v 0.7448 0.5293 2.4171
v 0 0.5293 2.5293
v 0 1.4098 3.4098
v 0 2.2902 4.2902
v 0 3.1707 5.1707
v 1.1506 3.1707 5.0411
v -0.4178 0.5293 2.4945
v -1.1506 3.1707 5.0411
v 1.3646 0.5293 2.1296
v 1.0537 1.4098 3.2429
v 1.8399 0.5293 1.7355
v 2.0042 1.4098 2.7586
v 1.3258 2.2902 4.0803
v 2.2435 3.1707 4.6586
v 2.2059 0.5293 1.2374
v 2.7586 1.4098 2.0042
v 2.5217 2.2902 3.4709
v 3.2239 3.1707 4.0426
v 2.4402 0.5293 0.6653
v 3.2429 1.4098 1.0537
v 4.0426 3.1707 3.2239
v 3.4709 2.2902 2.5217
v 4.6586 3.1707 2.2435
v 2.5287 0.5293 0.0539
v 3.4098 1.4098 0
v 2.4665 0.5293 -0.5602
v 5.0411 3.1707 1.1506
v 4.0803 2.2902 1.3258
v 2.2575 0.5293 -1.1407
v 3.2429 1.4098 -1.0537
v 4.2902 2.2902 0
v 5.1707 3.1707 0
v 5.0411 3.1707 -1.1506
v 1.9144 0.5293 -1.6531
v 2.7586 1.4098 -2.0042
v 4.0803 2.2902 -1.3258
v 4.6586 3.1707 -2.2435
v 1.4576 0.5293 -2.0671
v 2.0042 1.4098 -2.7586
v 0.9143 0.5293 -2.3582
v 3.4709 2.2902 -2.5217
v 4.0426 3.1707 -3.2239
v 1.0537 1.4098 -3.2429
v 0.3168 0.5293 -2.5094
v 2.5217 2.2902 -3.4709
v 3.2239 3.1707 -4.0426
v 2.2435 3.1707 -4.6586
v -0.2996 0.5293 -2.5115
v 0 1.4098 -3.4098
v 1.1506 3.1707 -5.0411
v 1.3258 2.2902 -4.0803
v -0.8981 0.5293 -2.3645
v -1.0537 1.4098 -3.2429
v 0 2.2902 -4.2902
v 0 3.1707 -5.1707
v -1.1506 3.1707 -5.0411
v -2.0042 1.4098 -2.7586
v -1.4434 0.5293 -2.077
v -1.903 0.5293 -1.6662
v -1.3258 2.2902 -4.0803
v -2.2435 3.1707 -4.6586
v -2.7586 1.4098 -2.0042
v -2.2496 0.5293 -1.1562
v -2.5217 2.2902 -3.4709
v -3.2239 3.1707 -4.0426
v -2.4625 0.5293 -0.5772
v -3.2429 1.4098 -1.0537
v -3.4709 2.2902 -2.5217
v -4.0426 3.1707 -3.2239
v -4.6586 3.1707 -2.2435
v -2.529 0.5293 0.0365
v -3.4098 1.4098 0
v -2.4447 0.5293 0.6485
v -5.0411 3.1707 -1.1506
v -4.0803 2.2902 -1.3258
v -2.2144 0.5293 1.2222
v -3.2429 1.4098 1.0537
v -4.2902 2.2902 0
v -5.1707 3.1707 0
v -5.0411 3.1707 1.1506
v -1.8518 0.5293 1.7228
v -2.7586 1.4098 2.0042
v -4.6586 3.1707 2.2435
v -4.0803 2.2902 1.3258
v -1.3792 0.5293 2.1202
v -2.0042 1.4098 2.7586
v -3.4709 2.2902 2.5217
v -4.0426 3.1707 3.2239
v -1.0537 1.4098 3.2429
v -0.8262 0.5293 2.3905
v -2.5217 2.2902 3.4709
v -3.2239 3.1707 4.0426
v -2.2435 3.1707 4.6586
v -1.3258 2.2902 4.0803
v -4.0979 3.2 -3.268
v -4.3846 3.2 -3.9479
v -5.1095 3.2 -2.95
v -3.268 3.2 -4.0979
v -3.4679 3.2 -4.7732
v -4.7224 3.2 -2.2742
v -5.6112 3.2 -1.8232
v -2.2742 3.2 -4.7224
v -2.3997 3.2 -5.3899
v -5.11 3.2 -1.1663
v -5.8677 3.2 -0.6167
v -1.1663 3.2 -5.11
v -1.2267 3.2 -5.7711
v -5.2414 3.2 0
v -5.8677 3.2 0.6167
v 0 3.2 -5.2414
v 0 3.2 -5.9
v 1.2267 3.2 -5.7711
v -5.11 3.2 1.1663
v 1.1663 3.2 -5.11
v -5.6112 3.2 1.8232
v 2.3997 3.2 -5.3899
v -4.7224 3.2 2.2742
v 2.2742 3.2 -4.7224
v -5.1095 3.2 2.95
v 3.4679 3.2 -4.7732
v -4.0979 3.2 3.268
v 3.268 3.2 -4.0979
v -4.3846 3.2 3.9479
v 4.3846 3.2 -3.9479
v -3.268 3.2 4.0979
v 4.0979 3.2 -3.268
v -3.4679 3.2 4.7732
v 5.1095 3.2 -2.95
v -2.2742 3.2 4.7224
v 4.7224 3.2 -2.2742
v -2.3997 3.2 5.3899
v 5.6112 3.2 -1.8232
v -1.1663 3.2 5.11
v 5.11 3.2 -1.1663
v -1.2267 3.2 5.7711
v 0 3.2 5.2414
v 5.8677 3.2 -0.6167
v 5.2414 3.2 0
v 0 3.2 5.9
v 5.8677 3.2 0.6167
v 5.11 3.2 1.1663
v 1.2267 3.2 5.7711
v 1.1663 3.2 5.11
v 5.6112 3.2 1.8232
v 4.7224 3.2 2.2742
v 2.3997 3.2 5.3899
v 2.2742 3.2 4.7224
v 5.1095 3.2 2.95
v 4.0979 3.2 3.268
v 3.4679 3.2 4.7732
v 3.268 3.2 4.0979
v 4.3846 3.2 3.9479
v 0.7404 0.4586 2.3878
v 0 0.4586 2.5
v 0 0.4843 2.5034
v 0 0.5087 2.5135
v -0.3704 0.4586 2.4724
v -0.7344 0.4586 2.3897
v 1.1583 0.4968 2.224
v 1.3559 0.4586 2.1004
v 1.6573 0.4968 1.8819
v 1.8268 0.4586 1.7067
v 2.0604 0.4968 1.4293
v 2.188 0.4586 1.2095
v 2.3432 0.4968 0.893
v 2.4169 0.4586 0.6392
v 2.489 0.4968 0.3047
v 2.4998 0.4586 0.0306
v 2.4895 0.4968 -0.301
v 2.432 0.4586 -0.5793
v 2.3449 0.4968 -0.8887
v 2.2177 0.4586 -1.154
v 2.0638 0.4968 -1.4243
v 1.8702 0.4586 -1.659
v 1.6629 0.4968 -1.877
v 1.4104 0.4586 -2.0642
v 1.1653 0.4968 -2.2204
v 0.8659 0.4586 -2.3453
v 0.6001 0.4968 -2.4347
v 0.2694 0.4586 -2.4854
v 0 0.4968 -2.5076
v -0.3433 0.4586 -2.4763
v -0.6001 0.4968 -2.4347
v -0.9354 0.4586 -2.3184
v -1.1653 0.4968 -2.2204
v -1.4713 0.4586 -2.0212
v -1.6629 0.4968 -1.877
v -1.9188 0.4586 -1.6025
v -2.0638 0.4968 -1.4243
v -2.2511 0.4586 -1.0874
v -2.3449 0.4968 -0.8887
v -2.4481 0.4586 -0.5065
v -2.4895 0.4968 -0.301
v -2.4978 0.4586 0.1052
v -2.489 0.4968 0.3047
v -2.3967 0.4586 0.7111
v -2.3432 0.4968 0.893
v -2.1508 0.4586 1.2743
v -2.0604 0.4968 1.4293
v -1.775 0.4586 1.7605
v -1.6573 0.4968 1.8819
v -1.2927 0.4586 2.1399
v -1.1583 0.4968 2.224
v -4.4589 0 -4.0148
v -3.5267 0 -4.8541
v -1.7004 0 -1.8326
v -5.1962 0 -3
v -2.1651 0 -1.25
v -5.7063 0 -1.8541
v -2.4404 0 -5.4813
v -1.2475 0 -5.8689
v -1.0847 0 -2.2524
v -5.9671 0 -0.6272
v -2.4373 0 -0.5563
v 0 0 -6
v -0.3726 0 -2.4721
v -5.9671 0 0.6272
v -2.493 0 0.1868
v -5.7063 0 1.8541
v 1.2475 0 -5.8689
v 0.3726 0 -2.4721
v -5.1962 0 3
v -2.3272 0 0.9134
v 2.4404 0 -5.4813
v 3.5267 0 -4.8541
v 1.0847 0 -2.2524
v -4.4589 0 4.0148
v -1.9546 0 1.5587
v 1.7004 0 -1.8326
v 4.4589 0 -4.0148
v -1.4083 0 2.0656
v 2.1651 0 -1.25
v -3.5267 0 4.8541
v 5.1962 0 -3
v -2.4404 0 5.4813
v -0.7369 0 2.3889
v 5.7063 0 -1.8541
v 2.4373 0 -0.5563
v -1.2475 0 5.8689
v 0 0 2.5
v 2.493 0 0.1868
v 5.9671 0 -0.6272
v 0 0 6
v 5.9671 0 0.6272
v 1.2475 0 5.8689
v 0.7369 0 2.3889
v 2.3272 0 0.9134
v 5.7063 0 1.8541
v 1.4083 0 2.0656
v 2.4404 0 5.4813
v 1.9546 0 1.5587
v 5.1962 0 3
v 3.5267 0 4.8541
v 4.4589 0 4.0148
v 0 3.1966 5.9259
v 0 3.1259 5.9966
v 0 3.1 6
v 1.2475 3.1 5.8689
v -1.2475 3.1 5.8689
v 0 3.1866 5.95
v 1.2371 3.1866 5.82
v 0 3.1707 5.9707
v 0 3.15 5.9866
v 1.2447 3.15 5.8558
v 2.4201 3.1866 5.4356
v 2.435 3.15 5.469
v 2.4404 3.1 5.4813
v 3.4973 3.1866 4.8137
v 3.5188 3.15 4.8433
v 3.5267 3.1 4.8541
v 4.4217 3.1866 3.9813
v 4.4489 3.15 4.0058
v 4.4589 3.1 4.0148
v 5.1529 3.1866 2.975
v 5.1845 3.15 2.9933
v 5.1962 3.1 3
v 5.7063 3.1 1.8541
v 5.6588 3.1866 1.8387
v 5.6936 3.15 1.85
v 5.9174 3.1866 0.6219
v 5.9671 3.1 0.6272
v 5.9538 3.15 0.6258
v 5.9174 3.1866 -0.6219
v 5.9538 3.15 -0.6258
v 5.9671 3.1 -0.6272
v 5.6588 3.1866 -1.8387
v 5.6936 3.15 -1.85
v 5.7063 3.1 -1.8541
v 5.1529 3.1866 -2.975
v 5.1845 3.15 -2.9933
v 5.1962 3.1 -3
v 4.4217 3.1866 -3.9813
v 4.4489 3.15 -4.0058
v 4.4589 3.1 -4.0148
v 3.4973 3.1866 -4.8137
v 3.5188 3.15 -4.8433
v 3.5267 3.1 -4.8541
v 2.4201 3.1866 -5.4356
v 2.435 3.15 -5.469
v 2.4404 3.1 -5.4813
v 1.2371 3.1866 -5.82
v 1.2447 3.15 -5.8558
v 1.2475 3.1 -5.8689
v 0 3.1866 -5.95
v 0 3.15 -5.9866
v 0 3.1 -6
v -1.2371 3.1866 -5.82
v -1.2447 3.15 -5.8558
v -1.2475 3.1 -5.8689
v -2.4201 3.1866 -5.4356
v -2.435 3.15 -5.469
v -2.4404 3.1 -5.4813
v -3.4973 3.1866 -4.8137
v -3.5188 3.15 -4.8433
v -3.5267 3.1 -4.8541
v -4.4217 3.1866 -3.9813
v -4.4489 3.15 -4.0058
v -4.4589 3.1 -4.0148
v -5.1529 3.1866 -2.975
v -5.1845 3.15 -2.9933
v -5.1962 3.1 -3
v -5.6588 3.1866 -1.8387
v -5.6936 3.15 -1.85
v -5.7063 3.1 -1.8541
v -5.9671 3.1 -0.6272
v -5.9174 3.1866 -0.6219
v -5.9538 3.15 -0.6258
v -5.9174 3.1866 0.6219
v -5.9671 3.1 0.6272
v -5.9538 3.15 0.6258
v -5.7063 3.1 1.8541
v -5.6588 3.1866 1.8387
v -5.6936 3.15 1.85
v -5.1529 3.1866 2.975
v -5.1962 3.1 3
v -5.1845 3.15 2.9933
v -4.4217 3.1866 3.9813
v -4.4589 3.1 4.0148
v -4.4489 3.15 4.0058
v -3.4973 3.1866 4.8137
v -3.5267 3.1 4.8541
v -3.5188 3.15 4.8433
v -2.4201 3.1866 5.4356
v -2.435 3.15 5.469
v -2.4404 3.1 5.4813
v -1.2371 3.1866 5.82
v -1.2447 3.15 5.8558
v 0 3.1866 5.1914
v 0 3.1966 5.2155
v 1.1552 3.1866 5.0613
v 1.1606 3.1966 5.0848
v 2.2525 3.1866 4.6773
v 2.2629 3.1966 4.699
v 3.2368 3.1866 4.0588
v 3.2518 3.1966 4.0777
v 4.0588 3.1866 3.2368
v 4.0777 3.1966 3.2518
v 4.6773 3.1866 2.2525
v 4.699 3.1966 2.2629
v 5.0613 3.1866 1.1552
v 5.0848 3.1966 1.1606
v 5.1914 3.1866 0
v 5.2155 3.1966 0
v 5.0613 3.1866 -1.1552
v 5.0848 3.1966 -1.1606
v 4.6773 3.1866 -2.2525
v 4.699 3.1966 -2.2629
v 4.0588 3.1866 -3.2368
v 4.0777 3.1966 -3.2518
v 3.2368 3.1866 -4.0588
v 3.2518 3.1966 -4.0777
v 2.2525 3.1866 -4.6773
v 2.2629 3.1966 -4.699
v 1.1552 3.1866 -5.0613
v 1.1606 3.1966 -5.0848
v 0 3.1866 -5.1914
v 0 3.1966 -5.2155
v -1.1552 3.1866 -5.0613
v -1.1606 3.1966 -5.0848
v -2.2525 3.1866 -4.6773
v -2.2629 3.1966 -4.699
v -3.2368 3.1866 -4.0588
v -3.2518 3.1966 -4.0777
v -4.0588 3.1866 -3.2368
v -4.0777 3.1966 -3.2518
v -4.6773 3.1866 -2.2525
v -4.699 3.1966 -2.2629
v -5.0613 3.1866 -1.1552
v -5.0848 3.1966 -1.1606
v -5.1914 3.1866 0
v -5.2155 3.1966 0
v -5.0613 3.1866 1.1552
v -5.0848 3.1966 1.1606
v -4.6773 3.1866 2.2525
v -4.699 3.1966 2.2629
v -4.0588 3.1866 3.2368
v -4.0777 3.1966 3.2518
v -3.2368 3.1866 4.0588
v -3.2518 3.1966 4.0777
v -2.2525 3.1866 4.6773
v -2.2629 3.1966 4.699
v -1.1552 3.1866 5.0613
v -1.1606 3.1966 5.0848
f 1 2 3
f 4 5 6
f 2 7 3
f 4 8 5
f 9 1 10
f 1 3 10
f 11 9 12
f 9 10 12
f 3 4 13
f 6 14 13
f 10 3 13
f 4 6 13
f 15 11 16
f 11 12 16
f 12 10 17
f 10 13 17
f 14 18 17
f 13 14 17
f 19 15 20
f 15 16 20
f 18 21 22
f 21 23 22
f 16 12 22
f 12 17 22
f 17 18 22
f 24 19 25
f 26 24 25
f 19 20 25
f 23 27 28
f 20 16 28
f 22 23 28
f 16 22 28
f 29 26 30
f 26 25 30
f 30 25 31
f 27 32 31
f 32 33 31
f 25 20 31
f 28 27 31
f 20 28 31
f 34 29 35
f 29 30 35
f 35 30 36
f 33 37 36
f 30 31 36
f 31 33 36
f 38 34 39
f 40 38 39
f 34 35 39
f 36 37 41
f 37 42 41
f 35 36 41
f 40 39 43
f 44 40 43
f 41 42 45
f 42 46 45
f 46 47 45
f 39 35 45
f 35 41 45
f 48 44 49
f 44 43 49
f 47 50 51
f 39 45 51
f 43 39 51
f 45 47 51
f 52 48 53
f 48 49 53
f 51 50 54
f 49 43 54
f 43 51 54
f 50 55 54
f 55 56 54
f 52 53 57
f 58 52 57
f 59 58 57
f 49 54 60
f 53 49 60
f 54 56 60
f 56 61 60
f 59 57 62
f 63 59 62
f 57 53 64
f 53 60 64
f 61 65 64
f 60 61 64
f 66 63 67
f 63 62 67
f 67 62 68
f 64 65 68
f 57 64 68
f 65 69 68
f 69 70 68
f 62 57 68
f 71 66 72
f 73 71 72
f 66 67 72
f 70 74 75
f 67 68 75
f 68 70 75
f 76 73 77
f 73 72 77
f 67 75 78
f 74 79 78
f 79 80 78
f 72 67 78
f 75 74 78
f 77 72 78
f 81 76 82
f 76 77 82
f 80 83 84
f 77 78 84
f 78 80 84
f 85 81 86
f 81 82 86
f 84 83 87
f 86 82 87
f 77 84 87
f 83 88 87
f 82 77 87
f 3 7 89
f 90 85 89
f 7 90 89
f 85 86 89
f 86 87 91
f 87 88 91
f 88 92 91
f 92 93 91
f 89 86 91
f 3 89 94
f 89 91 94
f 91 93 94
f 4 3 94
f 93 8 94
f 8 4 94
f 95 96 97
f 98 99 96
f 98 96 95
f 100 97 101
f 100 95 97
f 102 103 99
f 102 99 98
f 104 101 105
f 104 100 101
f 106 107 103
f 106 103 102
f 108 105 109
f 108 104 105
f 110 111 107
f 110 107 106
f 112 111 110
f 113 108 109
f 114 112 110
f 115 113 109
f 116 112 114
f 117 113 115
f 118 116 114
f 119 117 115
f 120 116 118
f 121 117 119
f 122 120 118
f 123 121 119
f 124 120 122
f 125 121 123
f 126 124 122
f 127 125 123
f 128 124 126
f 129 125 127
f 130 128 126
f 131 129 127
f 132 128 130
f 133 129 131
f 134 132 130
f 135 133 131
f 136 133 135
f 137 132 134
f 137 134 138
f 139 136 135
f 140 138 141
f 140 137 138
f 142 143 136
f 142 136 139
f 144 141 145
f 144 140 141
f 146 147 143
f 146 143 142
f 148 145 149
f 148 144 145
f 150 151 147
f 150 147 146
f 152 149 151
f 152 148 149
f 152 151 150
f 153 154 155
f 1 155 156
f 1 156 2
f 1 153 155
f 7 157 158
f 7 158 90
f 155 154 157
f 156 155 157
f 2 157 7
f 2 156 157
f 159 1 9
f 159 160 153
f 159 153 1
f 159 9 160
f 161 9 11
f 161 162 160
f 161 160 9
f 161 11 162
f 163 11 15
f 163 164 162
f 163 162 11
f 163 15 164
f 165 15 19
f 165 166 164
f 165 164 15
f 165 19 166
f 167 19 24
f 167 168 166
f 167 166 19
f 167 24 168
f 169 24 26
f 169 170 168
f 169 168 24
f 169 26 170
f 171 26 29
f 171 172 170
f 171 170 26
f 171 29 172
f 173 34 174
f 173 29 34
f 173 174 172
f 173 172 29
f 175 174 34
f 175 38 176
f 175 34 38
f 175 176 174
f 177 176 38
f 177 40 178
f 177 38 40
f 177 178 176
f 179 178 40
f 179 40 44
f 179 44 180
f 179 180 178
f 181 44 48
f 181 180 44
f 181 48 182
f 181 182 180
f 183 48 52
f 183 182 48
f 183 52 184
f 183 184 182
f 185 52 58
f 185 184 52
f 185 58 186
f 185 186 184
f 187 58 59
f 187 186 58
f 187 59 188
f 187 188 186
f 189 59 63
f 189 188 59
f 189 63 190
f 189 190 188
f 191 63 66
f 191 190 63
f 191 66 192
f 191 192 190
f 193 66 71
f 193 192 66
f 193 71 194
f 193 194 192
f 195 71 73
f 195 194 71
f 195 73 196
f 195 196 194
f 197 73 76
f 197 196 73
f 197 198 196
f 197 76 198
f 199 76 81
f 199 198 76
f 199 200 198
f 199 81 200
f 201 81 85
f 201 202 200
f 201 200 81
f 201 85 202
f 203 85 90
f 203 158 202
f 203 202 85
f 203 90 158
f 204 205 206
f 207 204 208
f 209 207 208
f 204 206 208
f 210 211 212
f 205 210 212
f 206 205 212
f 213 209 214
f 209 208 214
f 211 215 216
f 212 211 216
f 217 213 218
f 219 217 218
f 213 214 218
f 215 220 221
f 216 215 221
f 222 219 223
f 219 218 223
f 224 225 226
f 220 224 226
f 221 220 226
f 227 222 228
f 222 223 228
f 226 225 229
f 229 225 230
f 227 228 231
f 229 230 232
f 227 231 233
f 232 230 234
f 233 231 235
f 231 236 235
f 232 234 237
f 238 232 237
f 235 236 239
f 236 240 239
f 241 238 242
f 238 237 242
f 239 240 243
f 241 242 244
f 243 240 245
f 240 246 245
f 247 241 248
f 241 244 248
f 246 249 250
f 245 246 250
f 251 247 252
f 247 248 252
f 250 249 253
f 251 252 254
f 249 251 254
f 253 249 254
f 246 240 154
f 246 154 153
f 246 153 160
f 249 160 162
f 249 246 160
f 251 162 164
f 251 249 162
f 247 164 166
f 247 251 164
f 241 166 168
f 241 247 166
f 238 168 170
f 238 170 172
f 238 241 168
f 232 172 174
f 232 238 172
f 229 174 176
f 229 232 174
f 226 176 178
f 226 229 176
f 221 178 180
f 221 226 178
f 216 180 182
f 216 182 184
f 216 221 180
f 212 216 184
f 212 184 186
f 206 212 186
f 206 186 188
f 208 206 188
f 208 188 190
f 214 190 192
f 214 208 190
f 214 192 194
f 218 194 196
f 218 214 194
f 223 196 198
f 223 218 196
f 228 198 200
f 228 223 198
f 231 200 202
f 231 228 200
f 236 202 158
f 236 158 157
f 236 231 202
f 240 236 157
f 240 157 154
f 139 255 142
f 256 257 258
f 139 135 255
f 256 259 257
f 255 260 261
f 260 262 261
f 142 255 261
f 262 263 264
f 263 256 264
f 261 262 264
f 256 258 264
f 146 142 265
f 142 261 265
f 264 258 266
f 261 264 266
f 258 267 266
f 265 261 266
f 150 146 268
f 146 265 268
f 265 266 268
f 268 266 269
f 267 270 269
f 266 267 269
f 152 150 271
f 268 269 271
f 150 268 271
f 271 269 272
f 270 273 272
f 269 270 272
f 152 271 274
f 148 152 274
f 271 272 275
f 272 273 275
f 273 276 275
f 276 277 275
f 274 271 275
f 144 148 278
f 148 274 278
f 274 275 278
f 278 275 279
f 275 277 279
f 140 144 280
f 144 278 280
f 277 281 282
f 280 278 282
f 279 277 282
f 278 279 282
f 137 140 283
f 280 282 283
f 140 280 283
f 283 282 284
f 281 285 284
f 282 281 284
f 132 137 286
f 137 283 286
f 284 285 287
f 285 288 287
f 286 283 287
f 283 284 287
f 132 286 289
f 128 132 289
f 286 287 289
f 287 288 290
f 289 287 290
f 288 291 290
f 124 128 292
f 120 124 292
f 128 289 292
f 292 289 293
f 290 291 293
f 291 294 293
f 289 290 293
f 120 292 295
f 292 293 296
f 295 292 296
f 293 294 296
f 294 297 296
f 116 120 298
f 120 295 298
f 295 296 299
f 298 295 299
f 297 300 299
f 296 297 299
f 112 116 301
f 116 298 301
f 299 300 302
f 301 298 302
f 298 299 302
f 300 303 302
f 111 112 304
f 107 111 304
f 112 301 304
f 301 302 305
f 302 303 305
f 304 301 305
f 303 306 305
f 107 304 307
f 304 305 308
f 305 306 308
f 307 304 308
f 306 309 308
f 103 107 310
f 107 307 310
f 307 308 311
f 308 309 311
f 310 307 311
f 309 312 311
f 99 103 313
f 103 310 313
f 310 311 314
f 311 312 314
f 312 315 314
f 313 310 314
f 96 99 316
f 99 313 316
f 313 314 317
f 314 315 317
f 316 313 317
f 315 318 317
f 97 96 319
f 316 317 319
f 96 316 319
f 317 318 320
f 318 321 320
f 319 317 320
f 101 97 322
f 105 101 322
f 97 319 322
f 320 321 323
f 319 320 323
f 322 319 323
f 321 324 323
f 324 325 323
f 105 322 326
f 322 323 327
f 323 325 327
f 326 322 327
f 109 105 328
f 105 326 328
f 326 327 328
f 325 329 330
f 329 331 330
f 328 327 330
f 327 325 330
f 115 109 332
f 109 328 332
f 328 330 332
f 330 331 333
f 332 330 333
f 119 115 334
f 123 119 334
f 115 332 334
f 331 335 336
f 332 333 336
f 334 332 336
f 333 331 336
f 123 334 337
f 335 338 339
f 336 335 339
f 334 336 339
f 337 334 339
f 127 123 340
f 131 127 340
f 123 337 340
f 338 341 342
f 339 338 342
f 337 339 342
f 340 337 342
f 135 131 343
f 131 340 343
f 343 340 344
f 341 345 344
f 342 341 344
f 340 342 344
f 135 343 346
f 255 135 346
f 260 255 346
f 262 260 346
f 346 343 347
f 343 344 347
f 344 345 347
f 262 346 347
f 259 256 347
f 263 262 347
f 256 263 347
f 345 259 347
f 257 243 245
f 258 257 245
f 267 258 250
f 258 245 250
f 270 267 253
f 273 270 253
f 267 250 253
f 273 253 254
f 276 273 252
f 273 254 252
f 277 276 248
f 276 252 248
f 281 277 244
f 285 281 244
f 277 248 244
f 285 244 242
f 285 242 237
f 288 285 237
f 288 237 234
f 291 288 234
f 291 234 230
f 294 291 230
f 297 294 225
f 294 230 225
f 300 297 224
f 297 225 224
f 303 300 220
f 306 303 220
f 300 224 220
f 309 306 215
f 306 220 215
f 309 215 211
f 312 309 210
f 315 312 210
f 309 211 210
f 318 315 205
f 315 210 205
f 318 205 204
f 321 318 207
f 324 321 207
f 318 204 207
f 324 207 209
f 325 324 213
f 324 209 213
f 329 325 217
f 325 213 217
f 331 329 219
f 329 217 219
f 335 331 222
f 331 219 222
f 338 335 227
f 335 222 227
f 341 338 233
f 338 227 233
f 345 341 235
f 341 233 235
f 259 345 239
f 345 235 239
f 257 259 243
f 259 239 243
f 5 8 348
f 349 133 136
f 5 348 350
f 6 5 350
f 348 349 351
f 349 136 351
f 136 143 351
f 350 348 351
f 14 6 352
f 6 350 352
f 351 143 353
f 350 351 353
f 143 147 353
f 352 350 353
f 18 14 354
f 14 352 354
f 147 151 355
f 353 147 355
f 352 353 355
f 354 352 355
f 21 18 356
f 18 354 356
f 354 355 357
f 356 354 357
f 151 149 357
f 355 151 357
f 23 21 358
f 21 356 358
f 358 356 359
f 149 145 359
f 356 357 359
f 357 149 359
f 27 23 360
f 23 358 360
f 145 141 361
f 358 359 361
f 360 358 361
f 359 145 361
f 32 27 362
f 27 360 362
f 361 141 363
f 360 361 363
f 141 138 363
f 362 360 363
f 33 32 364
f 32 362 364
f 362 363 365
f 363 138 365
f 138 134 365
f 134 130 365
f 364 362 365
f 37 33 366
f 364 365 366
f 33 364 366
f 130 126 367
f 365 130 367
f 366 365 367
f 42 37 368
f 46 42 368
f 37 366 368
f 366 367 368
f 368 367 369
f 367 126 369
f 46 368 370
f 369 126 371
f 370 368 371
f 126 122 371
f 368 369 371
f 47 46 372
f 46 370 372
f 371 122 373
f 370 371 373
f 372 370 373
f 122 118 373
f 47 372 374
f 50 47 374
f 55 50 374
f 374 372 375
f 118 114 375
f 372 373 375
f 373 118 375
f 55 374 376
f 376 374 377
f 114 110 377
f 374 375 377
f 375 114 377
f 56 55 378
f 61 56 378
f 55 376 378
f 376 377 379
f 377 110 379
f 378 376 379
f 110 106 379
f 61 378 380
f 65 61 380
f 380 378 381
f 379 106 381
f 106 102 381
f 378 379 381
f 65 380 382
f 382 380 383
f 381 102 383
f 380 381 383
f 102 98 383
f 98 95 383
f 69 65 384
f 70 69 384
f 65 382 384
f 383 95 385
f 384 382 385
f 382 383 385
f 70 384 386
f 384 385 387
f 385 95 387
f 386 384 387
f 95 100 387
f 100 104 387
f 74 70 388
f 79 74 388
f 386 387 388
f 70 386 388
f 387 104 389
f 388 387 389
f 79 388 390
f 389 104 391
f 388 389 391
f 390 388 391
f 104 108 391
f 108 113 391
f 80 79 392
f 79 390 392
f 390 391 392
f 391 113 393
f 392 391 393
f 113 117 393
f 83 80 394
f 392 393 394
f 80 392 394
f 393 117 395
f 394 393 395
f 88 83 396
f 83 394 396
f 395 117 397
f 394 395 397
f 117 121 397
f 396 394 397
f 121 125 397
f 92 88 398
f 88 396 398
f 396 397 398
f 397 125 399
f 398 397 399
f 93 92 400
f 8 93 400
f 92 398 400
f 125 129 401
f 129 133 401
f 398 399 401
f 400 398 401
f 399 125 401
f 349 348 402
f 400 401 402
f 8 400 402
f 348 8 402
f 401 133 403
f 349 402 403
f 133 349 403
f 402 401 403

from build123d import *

# Parameters (mm, degrees)
SKETCH_1_R      = 6
SKETCH_1_R_2    = 2.5
EXTRUDE_1_DEPTH = 3.2
CHAMFER_1_SIZE  = 2.7
FILLET_1_R      = 0.1


with BuildPart() as part:
    # 草图1 → 凸台-拉伸1 (new body)
    with BuildSketch(Plane(origin=(0, 0, 0), x_dir=(1, 0, 0), z_dir=(0, 1, 0))):
        with Locations(Location((0, 0, 0), (0, 0, 270))):
            Circle(SKETCH_1_R)
        with Locations(Location((0, 0, 0), (0, 0, 270))):
            Circle(SKETCH_1_R_2, mode=Mode.SUBTRACT)
    extrude(amount=EXTRUDE_1_DEPTH)

    # 倒角1
    chamfer_1_edges = [part.edges().sort_by_distance(p)[0] for p in [
        (0, 3.2, -2.5),
    ]]
    chamfer(chamfer_1_edges, length=CHAMFER_1_SIZE)

    # 圆角1
    fillet_1_edges = [part.edges().sort_by_distance(p)[0] for p in [
        (0, 3.2, -5.2),
        (0, 3.2, -6),
        (0, 0.5, -2.5),
    ]]
    fillet(fillet_1_edges, radius=FILLET_1_R)


solid = part.part
